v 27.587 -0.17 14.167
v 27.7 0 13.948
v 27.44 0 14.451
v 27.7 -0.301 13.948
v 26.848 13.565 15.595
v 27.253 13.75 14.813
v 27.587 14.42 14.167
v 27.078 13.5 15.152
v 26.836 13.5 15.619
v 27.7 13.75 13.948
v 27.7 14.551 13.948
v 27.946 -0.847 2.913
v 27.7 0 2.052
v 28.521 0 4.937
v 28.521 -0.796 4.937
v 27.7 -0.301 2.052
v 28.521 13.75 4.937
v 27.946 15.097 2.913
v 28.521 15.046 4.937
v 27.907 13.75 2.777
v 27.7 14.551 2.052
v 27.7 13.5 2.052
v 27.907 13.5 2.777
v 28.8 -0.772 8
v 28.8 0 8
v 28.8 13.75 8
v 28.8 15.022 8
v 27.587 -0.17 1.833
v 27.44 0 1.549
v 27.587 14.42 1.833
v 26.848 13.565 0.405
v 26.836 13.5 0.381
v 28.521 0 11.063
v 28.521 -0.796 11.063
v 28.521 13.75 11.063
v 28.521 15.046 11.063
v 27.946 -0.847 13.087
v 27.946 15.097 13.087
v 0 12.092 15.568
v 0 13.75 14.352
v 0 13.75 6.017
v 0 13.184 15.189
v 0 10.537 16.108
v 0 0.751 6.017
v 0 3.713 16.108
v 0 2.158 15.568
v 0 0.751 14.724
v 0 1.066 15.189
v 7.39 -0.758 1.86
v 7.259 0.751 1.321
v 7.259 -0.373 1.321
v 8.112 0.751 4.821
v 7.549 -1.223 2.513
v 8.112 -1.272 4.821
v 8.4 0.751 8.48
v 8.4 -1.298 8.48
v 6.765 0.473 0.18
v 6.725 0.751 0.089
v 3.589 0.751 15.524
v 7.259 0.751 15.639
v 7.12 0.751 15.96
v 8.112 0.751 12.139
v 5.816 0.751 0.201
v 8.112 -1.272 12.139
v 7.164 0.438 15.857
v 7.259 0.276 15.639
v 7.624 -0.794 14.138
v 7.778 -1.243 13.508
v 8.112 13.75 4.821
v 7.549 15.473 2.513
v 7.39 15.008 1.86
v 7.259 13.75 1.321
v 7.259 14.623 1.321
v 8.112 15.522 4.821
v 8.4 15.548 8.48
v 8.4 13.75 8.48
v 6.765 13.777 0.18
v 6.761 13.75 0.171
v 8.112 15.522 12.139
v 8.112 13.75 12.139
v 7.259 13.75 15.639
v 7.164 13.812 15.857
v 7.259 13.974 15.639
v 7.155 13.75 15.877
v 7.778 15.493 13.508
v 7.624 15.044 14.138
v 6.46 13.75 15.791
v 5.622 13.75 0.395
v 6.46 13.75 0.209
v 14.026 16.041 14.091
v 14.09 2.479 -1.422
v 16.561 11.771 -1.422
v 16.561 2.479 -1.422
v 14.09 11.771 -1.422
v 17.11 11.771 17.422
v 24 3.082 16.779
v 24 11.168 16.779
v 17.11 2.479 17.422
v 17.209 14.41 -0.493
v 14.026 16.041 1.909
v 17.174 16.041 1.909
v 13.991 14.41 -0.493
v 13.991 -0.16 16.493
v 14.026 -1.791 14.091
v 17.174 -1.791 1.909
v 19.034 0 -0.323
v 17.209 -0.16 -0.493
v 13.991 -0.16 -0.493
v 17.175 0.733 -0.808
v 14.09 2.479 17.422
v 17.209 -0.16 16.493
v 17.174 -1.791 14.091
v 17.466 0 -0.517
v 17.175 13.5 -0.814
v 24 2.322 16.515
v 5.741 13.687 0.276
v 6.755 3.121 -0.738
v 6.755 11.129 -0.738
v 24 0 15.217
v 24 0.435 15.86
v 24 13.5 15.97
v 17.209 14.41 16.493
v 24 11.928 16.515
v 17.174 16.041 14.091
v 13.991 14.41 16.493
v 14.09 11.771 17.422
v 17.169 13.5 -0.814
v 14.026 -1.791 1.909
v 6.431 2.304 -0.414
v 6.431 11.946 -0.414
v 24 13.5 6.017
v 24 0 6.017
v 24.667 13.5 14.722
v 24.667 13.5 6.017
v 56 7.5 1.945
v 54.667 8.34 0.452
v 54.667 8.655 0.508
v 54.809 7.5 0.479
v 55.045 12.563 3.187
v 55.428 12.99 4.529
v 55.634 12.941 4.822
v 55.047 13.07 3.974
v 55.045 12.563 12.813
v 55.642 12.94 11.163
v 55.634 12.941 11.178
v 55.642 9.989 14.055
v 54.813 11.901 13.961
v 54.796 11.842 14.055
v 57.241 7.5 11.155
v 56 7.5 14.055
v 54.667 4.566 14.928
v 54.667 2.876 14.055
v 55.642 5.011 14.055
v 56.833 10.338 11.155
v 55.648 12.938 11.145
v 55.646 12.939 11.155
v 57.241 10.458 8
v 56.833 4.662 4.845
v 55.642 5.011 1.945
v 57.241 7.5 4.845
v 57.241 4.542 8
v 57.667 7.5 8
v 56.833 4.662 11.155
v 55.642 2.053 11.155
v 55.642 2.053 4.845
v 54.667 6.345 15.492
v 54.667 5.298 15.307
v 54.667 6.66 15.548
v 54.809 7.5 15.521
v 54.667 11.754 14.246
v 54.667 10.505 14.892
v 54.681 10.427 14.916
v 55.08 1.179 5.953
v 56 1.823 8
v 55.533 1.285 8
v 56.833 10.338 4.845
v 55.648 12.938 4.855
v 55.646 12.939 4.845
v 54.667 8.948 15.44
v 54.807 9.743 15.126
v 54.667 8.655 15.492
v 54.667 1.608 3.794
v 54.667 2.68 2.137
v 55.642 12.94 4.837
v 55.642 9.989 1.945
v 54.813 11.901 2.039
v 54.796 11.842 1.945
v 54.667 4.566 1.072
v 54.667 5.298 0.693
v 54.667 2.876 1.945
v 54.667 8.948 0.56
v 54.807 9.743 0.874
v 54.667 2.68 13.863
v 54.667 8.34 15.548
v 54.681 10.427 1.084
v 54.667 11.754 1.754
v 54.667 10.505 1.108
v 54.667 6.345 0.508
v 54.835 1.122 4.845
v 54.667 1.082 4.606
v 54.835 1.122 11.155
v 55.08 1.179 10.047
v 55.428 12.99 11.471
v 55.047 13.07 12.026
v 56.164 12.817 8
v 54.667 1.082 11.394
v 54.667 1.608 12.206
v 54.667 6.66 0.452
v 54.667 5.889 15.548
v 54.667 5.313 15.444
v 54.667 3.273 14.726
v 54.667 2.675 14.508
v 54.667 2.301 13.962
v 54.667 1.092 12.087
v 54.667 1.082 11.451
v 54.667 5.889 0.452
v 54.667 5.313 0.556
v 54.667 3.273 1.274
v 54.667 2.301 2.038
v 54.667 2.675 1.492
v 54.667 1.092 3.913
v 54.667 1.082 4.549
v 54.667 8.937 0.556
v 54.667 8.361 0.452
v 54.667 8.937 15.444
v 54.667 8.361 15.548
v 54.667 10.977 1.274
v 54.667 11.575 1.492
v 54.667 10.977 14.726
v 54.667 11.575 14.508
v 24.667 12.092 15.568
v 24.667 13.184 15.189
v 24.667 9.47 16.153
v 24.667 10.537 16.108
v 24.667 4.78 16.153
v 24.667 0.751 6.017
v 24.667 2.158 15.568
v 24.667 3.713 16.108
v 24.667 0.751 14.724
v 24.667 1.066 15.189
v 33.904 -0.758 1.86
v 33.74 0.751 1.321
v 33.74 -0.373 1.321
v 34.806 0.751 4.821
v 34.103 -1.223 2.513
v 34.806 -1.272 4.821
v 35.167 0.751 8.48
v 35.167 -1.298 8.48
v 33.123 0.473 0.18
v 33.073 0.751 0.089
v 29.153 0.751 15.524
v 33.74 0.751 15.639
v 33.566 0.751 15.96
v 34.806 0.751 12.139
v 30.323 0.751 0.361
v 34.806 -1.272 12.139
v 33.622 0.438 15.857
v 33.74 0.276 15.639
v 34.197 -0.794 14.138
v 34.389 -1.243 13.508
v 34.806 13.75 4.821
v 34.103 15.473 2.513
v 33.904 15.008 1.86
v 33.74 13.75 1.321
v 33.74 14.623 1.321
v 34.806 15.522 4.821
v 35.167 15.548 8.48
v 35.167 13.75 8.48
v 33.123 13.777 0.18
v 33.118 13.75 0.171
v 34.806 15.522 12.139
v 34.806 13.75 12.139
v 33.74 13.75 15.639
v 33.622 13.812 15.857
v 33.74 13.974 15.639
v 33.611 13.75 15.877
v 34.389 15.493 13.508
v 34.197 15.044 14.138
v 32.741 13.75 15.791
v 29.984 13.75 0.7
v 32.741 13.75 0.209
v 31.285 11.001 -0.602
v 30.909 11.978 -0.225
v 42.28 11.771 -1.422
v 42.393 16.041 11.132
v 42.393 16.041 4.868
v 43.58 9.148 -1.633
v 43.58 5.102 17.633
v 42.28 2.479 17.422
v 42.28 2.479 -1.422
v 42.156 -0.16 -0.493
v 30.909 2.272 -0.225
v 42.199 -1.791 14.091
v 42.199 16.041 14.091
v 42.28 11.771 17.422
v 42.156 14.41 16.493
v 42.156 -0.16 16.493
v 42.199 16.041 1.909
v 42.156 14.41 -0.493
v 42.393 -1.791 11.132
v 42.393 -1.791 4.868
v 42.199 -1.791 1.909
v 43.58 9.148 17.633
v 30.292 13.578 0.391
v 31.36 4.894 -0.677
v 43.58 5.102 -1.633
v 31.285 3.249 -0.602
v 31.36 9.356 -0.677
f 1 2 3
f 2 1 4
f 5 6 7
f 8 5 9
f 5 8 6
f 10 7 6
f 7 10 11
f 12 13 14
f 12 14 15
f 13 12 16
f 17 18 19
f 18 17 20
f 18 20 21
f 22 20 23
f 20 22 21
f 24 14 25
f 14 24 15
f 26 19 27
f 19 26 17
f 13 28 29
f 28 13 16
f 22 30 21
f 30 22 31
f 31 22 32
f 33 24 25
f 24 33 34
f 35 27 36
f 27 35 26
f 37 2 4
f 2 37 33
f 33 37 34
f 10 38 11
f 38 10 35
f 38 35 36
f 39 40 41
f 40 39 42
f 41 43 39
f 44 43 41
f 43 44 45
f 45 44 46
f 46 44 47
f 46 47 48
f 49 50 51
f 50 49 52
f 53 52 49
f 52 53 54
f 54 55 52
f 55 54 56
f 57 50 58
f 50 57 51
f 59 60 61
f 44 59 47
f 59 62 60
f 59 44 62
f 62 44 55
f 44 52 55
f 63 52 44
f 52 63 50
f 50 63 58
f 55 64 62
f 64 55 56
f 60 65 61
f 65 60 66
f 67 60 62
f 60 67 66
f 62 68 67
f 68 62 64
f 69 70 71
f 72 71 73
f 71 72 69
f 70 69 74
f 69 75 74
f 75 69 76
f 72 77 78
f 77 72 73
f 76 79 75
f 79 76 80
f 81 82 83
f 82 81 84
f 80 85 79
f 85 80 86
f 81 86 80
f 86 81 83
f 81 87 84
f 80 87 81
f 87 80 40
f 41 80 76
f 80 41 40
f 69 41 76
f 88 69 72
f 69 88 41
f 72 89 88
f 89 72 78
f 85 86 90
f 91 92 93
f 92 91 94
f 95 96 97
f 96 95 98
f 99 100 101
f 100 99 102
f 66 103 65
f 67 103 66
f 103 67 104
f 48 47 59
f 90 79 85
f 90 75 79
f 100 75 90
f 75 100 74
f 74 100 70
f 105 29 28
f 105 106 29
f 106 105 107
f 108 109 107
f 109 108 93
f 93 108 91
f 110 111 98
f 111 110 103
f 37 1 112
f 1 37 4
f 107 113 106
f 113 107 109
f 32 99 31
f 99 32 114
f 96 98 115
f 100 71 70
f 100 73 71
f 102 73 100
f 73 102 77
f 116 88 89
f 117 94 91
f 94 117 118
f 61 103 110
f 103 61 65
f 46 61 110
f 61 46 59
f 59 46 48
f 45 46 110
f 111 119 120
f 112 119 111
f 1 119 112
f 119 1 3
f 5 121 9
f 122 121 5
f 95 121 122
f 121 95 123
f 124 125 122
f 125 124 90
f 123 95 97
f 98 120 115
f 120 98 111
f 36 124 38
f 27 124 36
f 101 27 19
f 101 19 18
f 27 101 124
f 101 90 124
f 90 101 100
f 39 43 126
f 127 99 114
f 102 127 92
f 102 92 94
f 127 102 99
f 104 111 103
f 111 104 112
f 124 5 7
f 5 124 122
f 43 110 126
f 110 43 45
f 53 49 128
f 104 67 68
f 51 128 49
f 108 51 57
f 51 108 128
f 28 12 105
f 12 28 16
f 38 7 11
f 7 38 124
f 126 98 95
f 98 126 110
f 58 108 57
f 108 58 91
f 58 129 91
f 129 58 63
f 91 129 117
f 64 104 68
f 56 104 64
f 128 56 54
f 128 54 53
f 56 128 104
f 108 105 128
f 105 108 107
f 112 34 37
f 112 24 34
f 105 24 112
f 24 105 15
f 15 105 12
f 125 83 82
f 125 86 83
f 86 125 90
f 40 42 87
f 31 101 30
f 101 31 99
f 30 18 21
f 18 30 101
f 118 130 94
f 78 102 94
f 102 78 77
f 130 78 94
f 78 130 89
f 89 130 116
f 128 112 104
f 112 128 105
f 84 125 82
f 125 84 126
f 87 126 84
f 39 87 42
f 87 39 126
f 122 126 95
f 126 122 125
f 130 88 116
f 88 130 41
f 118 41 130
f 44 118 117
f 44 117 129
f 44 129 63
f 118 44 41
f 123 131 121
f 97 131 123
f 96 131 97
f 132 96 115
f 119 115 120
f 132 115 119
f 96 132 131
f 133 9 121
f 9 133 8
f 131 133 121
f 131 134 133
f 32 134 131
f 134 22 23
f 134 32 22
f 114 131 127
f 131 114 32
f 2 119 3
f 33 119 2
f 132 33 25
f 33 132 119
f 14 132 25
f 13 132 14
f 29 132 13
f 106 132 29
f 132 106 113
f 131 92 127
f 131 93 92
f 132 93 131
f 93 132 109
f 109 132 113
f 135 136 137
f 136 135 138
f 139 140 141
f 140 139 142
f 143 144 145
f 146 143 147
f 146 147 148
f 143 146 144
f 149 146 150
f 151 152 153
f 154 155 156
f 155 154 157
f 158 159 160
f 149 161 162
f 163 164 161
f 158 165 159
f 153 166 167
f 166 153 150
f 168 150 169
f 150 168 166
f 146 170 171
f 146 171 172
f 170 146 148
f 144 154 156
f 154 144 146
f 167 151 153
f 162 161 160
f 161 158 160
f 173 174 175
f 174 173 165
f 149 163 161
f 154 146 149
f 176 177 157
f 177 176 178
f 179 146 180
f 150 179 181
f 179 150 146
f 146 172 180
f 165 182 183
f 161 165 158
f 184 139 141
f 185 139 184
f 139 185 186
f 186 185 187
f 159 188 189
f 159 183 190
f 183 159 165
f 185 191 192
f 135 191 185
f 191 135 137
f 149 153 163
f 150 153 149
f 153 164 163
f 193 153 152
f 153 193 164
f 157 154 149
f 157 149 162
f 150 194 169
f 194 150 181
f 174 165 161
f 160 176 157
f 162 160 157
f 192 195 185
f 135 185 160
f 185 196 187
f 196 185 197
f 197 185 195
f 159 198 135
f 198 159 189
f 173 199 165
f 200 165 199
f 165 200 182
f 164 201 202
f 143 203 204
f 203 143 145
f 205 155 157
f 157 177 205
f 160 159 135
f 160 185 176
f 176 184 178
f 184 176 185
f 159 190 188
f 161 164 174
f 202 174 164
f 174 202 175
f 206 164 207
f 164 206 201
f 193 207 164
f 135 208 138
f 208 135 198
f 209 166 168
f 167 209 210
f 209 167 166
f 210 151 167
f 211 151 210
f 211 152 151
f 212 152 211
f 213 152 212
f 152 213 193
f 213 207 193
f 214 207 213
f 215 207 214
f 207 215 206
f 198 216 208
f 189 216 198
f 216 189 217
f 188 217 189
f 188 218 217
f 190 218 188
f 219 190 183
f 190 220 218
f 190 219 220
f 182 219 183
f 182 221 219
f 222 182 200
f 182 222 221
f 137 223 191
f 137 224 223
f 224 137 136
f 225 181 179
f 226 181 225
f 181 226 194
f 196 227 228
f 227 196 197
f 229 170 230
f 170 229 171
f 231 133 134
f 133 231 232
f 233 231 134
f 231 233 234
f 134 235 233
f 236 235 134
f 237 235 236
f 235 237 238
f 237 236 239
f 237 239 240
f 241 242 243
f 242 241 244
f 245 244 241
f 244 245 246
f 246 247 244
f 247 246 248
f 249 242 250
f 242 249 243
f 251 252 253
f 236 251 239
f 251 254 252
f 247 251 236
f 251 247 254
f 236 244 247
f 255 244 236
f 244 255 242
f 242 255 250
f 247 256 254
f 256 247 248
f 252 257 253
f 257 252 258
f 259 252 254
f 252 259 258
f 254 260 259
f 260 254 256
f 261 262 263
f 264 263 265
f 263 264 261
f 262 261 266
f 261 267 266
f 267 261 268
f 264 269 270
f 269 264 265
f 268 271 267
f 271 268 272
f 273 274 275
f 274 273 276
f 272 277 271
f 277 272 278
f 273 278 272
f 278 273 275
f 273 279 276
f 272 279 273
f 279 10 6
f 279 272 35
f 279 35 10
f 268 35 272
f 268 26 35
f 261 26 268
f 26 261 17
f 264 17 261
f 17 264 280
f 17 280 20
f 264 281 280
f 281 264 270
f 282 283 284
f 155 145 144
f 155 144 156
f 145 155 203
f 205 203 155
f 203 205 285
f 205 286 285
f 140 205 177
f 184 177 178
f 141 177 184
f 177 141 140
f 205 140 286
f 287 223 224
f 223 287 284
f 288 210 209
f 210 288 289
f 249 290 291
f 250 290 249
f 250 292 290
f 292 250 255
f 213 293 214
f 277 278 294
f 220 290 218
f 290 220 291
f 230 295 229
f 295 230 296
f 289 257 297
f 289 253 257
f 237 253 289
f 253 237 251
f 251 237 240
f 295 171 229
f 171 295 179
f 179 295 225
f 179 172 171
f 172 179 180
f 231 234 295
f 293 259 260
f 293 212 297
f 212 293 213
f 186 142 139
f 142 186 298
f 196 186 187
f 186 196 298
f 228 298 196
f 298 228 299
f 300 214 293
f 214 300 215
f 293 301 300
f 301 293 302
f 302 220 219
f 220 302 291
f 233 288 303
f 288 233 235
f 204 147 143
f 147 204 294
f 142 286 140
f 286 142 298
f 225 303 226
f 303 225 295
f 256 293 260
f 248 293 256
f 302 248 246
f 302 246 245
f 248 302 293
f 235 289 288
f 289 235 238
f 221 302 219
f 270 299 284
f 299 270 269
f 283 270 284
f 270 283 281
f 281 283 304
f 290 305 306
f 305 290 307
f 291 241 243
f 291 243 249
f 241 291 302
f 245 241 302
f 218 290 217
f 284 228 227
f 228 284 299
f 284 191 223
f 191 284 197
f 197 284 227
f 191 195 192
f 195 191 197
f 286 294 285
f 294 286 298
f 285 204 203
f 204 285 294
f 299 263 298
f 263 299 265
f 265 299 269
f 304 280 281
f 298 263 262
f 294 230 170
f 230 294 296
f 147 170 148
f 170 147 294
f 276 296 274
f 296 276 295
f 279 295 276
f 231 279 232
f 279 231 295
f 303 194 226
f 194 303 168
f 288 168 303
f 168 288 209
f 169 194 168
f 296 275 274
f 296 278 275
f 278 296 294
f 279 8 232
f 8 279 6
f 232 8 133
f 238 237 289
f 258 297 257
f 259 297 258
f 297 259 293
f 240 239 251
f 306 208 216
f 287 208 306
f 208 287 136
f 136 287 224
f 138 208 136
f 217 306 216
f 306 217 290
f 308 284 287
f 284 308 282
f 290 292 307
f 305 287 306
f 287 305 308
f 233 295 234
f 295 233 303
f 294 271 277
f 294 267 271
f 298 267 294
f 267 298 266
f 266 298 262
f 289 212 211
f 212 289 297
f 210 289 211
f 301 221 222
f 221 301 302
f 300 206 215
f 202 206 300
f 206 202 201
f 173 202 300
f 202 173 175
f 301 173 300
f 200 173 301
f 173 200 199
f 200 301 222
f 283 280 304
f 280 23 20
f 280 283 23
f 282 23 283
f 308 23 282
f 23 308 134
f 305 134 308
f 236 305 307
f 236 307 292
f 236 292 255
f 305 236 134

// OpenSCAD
// file: util/finger-tip.scad
module fingertip(length,x,y,z,padding,width)
{ 
	difference() {
		scale([y,x,z]) {
			intersection() {
                difference() {
                    union() {
                        translate([length-5,5,5]) sphere(r =7);
                        translate([0,-5,-5]) cube([length,width + 10,20]);
                    }
                    //cutout for the side
                        translate([-4,-width+0.001,5.3]) rotate([-90,0,0]) cylinder(r=11,h=10);
                        translate([-4,width - padding*(1/x),5.3]) rotate([-90,0,0]) cylinder(r=11,h=10);
                }
                hull() {
                    for(i=[-1,1], j=[-1,1]) {
                        //angled cylinders to provide the outer shape of the finger
                        translate([length/10,i*2.4 + width/2,j*2.2 + 5]) rotate([i*j*-4,j*86,0]) cylinder(d=6,h=20,center=true);
                        //tip part
                        translate([length-3, i + width/2, j*2.2 + 5])rotate([i*j*-4,j*-80,0]) cylinder(d=6,h=10,center=true);  
                    }
                }              
            } 
		}
        translate([0,padding/2 * x,0])              
        fingerbasecutout(width-padding,x,z);
	}
}

module fingerbasecutout(width,x,z) {
	translate([-13/z,0,0]) rotate([0,45,0]) translate([-50,0,0]) cube([100,width*x, 10]);
}

rotate([0,-90,0]) fingertip(20,1.5,1.5,1.6,0.5,9.5);
// file: util/finger-base.scad
module fingerbase(length,x,y,z,padding,width)
{ 
	difference() {
		scale([y,x,z]) {
			intersection() {
                difference() {
                    union() {
                        translate([length-4,-5,5]) rotate([-90,0,0]) cylinder(r=8,h=width + 10);
                        translate([0,-5,-5]) cube([length,width + 10,20]);
                    }
                    //cutout for the side
                        translate([-4,-width+0.001,5.3]) rotate([-90,0,0]) cylinder(r=11,h=10);
                        translate([-4,width - padding*(1/x),5.3]) rotate([-90,0,0]) cylinder(r=11,h=10);
                }
                
                hull() {
                    for(i=[-1,1], j=[-1,1]) {
                        //angled cylinders to provide the outer shape of the finger
                        translate([length/10,i*2.4 + width/2,j*2.2 + 5]) rotate([i*j*-4,j*86,0]) cylinder(d=6,h=20,center=true);
                        translate([length+4, i*2.4 + width/2, j*2.2 + 5]) rotate([i*j*-4,j*-86,0]) cylinder(d=6,h=20,center=true);
                    }
                }
            } 
		}
        translate([0,padding/2 * x,0])              
        fingerbasecutout(width-padding,x,z);
        translate([length * y,0,0]) 
        mirror([1,0,0])fingerbasecutout(width-padding,x,z);
	}
}

module fingerbasecutout(width,x,z) {
	//cubic parts
	translate([-100,0,0]) cube([100,width*x,100]);
	translate([-13/z,0,0]) rotate([0,45,0]) translate([-50,0,0]) cube([100,width*x, 10]);
}

//fingerbase(20,1.5,1.5,1.6,0.5,9.5);
fingerbase(20,1.5,1.5,1.6,0.5,9.5);
// main file
use <util/finger-base.scad>;
use <util/finger-tip.scad>;

module middlefinger(length,x,y,z,angle){
    difference(){
        union(){
            //base object
            fingerbase(length,x,y-0.3,z,0.5,9.5);
            
            //rotate object
            //starting point t=0
            translate([length*1.4,0,length*0.4])
            //rotate
            rotate([0,angle*$t,0])
            //rotate point in the object
            translate([-length/6,0,-length/2.5])
            fingertip(length,x,y,z,0.5,9.5);
        }
    }
}

middlefinger(20,1.5,1.5,1.6,50);
